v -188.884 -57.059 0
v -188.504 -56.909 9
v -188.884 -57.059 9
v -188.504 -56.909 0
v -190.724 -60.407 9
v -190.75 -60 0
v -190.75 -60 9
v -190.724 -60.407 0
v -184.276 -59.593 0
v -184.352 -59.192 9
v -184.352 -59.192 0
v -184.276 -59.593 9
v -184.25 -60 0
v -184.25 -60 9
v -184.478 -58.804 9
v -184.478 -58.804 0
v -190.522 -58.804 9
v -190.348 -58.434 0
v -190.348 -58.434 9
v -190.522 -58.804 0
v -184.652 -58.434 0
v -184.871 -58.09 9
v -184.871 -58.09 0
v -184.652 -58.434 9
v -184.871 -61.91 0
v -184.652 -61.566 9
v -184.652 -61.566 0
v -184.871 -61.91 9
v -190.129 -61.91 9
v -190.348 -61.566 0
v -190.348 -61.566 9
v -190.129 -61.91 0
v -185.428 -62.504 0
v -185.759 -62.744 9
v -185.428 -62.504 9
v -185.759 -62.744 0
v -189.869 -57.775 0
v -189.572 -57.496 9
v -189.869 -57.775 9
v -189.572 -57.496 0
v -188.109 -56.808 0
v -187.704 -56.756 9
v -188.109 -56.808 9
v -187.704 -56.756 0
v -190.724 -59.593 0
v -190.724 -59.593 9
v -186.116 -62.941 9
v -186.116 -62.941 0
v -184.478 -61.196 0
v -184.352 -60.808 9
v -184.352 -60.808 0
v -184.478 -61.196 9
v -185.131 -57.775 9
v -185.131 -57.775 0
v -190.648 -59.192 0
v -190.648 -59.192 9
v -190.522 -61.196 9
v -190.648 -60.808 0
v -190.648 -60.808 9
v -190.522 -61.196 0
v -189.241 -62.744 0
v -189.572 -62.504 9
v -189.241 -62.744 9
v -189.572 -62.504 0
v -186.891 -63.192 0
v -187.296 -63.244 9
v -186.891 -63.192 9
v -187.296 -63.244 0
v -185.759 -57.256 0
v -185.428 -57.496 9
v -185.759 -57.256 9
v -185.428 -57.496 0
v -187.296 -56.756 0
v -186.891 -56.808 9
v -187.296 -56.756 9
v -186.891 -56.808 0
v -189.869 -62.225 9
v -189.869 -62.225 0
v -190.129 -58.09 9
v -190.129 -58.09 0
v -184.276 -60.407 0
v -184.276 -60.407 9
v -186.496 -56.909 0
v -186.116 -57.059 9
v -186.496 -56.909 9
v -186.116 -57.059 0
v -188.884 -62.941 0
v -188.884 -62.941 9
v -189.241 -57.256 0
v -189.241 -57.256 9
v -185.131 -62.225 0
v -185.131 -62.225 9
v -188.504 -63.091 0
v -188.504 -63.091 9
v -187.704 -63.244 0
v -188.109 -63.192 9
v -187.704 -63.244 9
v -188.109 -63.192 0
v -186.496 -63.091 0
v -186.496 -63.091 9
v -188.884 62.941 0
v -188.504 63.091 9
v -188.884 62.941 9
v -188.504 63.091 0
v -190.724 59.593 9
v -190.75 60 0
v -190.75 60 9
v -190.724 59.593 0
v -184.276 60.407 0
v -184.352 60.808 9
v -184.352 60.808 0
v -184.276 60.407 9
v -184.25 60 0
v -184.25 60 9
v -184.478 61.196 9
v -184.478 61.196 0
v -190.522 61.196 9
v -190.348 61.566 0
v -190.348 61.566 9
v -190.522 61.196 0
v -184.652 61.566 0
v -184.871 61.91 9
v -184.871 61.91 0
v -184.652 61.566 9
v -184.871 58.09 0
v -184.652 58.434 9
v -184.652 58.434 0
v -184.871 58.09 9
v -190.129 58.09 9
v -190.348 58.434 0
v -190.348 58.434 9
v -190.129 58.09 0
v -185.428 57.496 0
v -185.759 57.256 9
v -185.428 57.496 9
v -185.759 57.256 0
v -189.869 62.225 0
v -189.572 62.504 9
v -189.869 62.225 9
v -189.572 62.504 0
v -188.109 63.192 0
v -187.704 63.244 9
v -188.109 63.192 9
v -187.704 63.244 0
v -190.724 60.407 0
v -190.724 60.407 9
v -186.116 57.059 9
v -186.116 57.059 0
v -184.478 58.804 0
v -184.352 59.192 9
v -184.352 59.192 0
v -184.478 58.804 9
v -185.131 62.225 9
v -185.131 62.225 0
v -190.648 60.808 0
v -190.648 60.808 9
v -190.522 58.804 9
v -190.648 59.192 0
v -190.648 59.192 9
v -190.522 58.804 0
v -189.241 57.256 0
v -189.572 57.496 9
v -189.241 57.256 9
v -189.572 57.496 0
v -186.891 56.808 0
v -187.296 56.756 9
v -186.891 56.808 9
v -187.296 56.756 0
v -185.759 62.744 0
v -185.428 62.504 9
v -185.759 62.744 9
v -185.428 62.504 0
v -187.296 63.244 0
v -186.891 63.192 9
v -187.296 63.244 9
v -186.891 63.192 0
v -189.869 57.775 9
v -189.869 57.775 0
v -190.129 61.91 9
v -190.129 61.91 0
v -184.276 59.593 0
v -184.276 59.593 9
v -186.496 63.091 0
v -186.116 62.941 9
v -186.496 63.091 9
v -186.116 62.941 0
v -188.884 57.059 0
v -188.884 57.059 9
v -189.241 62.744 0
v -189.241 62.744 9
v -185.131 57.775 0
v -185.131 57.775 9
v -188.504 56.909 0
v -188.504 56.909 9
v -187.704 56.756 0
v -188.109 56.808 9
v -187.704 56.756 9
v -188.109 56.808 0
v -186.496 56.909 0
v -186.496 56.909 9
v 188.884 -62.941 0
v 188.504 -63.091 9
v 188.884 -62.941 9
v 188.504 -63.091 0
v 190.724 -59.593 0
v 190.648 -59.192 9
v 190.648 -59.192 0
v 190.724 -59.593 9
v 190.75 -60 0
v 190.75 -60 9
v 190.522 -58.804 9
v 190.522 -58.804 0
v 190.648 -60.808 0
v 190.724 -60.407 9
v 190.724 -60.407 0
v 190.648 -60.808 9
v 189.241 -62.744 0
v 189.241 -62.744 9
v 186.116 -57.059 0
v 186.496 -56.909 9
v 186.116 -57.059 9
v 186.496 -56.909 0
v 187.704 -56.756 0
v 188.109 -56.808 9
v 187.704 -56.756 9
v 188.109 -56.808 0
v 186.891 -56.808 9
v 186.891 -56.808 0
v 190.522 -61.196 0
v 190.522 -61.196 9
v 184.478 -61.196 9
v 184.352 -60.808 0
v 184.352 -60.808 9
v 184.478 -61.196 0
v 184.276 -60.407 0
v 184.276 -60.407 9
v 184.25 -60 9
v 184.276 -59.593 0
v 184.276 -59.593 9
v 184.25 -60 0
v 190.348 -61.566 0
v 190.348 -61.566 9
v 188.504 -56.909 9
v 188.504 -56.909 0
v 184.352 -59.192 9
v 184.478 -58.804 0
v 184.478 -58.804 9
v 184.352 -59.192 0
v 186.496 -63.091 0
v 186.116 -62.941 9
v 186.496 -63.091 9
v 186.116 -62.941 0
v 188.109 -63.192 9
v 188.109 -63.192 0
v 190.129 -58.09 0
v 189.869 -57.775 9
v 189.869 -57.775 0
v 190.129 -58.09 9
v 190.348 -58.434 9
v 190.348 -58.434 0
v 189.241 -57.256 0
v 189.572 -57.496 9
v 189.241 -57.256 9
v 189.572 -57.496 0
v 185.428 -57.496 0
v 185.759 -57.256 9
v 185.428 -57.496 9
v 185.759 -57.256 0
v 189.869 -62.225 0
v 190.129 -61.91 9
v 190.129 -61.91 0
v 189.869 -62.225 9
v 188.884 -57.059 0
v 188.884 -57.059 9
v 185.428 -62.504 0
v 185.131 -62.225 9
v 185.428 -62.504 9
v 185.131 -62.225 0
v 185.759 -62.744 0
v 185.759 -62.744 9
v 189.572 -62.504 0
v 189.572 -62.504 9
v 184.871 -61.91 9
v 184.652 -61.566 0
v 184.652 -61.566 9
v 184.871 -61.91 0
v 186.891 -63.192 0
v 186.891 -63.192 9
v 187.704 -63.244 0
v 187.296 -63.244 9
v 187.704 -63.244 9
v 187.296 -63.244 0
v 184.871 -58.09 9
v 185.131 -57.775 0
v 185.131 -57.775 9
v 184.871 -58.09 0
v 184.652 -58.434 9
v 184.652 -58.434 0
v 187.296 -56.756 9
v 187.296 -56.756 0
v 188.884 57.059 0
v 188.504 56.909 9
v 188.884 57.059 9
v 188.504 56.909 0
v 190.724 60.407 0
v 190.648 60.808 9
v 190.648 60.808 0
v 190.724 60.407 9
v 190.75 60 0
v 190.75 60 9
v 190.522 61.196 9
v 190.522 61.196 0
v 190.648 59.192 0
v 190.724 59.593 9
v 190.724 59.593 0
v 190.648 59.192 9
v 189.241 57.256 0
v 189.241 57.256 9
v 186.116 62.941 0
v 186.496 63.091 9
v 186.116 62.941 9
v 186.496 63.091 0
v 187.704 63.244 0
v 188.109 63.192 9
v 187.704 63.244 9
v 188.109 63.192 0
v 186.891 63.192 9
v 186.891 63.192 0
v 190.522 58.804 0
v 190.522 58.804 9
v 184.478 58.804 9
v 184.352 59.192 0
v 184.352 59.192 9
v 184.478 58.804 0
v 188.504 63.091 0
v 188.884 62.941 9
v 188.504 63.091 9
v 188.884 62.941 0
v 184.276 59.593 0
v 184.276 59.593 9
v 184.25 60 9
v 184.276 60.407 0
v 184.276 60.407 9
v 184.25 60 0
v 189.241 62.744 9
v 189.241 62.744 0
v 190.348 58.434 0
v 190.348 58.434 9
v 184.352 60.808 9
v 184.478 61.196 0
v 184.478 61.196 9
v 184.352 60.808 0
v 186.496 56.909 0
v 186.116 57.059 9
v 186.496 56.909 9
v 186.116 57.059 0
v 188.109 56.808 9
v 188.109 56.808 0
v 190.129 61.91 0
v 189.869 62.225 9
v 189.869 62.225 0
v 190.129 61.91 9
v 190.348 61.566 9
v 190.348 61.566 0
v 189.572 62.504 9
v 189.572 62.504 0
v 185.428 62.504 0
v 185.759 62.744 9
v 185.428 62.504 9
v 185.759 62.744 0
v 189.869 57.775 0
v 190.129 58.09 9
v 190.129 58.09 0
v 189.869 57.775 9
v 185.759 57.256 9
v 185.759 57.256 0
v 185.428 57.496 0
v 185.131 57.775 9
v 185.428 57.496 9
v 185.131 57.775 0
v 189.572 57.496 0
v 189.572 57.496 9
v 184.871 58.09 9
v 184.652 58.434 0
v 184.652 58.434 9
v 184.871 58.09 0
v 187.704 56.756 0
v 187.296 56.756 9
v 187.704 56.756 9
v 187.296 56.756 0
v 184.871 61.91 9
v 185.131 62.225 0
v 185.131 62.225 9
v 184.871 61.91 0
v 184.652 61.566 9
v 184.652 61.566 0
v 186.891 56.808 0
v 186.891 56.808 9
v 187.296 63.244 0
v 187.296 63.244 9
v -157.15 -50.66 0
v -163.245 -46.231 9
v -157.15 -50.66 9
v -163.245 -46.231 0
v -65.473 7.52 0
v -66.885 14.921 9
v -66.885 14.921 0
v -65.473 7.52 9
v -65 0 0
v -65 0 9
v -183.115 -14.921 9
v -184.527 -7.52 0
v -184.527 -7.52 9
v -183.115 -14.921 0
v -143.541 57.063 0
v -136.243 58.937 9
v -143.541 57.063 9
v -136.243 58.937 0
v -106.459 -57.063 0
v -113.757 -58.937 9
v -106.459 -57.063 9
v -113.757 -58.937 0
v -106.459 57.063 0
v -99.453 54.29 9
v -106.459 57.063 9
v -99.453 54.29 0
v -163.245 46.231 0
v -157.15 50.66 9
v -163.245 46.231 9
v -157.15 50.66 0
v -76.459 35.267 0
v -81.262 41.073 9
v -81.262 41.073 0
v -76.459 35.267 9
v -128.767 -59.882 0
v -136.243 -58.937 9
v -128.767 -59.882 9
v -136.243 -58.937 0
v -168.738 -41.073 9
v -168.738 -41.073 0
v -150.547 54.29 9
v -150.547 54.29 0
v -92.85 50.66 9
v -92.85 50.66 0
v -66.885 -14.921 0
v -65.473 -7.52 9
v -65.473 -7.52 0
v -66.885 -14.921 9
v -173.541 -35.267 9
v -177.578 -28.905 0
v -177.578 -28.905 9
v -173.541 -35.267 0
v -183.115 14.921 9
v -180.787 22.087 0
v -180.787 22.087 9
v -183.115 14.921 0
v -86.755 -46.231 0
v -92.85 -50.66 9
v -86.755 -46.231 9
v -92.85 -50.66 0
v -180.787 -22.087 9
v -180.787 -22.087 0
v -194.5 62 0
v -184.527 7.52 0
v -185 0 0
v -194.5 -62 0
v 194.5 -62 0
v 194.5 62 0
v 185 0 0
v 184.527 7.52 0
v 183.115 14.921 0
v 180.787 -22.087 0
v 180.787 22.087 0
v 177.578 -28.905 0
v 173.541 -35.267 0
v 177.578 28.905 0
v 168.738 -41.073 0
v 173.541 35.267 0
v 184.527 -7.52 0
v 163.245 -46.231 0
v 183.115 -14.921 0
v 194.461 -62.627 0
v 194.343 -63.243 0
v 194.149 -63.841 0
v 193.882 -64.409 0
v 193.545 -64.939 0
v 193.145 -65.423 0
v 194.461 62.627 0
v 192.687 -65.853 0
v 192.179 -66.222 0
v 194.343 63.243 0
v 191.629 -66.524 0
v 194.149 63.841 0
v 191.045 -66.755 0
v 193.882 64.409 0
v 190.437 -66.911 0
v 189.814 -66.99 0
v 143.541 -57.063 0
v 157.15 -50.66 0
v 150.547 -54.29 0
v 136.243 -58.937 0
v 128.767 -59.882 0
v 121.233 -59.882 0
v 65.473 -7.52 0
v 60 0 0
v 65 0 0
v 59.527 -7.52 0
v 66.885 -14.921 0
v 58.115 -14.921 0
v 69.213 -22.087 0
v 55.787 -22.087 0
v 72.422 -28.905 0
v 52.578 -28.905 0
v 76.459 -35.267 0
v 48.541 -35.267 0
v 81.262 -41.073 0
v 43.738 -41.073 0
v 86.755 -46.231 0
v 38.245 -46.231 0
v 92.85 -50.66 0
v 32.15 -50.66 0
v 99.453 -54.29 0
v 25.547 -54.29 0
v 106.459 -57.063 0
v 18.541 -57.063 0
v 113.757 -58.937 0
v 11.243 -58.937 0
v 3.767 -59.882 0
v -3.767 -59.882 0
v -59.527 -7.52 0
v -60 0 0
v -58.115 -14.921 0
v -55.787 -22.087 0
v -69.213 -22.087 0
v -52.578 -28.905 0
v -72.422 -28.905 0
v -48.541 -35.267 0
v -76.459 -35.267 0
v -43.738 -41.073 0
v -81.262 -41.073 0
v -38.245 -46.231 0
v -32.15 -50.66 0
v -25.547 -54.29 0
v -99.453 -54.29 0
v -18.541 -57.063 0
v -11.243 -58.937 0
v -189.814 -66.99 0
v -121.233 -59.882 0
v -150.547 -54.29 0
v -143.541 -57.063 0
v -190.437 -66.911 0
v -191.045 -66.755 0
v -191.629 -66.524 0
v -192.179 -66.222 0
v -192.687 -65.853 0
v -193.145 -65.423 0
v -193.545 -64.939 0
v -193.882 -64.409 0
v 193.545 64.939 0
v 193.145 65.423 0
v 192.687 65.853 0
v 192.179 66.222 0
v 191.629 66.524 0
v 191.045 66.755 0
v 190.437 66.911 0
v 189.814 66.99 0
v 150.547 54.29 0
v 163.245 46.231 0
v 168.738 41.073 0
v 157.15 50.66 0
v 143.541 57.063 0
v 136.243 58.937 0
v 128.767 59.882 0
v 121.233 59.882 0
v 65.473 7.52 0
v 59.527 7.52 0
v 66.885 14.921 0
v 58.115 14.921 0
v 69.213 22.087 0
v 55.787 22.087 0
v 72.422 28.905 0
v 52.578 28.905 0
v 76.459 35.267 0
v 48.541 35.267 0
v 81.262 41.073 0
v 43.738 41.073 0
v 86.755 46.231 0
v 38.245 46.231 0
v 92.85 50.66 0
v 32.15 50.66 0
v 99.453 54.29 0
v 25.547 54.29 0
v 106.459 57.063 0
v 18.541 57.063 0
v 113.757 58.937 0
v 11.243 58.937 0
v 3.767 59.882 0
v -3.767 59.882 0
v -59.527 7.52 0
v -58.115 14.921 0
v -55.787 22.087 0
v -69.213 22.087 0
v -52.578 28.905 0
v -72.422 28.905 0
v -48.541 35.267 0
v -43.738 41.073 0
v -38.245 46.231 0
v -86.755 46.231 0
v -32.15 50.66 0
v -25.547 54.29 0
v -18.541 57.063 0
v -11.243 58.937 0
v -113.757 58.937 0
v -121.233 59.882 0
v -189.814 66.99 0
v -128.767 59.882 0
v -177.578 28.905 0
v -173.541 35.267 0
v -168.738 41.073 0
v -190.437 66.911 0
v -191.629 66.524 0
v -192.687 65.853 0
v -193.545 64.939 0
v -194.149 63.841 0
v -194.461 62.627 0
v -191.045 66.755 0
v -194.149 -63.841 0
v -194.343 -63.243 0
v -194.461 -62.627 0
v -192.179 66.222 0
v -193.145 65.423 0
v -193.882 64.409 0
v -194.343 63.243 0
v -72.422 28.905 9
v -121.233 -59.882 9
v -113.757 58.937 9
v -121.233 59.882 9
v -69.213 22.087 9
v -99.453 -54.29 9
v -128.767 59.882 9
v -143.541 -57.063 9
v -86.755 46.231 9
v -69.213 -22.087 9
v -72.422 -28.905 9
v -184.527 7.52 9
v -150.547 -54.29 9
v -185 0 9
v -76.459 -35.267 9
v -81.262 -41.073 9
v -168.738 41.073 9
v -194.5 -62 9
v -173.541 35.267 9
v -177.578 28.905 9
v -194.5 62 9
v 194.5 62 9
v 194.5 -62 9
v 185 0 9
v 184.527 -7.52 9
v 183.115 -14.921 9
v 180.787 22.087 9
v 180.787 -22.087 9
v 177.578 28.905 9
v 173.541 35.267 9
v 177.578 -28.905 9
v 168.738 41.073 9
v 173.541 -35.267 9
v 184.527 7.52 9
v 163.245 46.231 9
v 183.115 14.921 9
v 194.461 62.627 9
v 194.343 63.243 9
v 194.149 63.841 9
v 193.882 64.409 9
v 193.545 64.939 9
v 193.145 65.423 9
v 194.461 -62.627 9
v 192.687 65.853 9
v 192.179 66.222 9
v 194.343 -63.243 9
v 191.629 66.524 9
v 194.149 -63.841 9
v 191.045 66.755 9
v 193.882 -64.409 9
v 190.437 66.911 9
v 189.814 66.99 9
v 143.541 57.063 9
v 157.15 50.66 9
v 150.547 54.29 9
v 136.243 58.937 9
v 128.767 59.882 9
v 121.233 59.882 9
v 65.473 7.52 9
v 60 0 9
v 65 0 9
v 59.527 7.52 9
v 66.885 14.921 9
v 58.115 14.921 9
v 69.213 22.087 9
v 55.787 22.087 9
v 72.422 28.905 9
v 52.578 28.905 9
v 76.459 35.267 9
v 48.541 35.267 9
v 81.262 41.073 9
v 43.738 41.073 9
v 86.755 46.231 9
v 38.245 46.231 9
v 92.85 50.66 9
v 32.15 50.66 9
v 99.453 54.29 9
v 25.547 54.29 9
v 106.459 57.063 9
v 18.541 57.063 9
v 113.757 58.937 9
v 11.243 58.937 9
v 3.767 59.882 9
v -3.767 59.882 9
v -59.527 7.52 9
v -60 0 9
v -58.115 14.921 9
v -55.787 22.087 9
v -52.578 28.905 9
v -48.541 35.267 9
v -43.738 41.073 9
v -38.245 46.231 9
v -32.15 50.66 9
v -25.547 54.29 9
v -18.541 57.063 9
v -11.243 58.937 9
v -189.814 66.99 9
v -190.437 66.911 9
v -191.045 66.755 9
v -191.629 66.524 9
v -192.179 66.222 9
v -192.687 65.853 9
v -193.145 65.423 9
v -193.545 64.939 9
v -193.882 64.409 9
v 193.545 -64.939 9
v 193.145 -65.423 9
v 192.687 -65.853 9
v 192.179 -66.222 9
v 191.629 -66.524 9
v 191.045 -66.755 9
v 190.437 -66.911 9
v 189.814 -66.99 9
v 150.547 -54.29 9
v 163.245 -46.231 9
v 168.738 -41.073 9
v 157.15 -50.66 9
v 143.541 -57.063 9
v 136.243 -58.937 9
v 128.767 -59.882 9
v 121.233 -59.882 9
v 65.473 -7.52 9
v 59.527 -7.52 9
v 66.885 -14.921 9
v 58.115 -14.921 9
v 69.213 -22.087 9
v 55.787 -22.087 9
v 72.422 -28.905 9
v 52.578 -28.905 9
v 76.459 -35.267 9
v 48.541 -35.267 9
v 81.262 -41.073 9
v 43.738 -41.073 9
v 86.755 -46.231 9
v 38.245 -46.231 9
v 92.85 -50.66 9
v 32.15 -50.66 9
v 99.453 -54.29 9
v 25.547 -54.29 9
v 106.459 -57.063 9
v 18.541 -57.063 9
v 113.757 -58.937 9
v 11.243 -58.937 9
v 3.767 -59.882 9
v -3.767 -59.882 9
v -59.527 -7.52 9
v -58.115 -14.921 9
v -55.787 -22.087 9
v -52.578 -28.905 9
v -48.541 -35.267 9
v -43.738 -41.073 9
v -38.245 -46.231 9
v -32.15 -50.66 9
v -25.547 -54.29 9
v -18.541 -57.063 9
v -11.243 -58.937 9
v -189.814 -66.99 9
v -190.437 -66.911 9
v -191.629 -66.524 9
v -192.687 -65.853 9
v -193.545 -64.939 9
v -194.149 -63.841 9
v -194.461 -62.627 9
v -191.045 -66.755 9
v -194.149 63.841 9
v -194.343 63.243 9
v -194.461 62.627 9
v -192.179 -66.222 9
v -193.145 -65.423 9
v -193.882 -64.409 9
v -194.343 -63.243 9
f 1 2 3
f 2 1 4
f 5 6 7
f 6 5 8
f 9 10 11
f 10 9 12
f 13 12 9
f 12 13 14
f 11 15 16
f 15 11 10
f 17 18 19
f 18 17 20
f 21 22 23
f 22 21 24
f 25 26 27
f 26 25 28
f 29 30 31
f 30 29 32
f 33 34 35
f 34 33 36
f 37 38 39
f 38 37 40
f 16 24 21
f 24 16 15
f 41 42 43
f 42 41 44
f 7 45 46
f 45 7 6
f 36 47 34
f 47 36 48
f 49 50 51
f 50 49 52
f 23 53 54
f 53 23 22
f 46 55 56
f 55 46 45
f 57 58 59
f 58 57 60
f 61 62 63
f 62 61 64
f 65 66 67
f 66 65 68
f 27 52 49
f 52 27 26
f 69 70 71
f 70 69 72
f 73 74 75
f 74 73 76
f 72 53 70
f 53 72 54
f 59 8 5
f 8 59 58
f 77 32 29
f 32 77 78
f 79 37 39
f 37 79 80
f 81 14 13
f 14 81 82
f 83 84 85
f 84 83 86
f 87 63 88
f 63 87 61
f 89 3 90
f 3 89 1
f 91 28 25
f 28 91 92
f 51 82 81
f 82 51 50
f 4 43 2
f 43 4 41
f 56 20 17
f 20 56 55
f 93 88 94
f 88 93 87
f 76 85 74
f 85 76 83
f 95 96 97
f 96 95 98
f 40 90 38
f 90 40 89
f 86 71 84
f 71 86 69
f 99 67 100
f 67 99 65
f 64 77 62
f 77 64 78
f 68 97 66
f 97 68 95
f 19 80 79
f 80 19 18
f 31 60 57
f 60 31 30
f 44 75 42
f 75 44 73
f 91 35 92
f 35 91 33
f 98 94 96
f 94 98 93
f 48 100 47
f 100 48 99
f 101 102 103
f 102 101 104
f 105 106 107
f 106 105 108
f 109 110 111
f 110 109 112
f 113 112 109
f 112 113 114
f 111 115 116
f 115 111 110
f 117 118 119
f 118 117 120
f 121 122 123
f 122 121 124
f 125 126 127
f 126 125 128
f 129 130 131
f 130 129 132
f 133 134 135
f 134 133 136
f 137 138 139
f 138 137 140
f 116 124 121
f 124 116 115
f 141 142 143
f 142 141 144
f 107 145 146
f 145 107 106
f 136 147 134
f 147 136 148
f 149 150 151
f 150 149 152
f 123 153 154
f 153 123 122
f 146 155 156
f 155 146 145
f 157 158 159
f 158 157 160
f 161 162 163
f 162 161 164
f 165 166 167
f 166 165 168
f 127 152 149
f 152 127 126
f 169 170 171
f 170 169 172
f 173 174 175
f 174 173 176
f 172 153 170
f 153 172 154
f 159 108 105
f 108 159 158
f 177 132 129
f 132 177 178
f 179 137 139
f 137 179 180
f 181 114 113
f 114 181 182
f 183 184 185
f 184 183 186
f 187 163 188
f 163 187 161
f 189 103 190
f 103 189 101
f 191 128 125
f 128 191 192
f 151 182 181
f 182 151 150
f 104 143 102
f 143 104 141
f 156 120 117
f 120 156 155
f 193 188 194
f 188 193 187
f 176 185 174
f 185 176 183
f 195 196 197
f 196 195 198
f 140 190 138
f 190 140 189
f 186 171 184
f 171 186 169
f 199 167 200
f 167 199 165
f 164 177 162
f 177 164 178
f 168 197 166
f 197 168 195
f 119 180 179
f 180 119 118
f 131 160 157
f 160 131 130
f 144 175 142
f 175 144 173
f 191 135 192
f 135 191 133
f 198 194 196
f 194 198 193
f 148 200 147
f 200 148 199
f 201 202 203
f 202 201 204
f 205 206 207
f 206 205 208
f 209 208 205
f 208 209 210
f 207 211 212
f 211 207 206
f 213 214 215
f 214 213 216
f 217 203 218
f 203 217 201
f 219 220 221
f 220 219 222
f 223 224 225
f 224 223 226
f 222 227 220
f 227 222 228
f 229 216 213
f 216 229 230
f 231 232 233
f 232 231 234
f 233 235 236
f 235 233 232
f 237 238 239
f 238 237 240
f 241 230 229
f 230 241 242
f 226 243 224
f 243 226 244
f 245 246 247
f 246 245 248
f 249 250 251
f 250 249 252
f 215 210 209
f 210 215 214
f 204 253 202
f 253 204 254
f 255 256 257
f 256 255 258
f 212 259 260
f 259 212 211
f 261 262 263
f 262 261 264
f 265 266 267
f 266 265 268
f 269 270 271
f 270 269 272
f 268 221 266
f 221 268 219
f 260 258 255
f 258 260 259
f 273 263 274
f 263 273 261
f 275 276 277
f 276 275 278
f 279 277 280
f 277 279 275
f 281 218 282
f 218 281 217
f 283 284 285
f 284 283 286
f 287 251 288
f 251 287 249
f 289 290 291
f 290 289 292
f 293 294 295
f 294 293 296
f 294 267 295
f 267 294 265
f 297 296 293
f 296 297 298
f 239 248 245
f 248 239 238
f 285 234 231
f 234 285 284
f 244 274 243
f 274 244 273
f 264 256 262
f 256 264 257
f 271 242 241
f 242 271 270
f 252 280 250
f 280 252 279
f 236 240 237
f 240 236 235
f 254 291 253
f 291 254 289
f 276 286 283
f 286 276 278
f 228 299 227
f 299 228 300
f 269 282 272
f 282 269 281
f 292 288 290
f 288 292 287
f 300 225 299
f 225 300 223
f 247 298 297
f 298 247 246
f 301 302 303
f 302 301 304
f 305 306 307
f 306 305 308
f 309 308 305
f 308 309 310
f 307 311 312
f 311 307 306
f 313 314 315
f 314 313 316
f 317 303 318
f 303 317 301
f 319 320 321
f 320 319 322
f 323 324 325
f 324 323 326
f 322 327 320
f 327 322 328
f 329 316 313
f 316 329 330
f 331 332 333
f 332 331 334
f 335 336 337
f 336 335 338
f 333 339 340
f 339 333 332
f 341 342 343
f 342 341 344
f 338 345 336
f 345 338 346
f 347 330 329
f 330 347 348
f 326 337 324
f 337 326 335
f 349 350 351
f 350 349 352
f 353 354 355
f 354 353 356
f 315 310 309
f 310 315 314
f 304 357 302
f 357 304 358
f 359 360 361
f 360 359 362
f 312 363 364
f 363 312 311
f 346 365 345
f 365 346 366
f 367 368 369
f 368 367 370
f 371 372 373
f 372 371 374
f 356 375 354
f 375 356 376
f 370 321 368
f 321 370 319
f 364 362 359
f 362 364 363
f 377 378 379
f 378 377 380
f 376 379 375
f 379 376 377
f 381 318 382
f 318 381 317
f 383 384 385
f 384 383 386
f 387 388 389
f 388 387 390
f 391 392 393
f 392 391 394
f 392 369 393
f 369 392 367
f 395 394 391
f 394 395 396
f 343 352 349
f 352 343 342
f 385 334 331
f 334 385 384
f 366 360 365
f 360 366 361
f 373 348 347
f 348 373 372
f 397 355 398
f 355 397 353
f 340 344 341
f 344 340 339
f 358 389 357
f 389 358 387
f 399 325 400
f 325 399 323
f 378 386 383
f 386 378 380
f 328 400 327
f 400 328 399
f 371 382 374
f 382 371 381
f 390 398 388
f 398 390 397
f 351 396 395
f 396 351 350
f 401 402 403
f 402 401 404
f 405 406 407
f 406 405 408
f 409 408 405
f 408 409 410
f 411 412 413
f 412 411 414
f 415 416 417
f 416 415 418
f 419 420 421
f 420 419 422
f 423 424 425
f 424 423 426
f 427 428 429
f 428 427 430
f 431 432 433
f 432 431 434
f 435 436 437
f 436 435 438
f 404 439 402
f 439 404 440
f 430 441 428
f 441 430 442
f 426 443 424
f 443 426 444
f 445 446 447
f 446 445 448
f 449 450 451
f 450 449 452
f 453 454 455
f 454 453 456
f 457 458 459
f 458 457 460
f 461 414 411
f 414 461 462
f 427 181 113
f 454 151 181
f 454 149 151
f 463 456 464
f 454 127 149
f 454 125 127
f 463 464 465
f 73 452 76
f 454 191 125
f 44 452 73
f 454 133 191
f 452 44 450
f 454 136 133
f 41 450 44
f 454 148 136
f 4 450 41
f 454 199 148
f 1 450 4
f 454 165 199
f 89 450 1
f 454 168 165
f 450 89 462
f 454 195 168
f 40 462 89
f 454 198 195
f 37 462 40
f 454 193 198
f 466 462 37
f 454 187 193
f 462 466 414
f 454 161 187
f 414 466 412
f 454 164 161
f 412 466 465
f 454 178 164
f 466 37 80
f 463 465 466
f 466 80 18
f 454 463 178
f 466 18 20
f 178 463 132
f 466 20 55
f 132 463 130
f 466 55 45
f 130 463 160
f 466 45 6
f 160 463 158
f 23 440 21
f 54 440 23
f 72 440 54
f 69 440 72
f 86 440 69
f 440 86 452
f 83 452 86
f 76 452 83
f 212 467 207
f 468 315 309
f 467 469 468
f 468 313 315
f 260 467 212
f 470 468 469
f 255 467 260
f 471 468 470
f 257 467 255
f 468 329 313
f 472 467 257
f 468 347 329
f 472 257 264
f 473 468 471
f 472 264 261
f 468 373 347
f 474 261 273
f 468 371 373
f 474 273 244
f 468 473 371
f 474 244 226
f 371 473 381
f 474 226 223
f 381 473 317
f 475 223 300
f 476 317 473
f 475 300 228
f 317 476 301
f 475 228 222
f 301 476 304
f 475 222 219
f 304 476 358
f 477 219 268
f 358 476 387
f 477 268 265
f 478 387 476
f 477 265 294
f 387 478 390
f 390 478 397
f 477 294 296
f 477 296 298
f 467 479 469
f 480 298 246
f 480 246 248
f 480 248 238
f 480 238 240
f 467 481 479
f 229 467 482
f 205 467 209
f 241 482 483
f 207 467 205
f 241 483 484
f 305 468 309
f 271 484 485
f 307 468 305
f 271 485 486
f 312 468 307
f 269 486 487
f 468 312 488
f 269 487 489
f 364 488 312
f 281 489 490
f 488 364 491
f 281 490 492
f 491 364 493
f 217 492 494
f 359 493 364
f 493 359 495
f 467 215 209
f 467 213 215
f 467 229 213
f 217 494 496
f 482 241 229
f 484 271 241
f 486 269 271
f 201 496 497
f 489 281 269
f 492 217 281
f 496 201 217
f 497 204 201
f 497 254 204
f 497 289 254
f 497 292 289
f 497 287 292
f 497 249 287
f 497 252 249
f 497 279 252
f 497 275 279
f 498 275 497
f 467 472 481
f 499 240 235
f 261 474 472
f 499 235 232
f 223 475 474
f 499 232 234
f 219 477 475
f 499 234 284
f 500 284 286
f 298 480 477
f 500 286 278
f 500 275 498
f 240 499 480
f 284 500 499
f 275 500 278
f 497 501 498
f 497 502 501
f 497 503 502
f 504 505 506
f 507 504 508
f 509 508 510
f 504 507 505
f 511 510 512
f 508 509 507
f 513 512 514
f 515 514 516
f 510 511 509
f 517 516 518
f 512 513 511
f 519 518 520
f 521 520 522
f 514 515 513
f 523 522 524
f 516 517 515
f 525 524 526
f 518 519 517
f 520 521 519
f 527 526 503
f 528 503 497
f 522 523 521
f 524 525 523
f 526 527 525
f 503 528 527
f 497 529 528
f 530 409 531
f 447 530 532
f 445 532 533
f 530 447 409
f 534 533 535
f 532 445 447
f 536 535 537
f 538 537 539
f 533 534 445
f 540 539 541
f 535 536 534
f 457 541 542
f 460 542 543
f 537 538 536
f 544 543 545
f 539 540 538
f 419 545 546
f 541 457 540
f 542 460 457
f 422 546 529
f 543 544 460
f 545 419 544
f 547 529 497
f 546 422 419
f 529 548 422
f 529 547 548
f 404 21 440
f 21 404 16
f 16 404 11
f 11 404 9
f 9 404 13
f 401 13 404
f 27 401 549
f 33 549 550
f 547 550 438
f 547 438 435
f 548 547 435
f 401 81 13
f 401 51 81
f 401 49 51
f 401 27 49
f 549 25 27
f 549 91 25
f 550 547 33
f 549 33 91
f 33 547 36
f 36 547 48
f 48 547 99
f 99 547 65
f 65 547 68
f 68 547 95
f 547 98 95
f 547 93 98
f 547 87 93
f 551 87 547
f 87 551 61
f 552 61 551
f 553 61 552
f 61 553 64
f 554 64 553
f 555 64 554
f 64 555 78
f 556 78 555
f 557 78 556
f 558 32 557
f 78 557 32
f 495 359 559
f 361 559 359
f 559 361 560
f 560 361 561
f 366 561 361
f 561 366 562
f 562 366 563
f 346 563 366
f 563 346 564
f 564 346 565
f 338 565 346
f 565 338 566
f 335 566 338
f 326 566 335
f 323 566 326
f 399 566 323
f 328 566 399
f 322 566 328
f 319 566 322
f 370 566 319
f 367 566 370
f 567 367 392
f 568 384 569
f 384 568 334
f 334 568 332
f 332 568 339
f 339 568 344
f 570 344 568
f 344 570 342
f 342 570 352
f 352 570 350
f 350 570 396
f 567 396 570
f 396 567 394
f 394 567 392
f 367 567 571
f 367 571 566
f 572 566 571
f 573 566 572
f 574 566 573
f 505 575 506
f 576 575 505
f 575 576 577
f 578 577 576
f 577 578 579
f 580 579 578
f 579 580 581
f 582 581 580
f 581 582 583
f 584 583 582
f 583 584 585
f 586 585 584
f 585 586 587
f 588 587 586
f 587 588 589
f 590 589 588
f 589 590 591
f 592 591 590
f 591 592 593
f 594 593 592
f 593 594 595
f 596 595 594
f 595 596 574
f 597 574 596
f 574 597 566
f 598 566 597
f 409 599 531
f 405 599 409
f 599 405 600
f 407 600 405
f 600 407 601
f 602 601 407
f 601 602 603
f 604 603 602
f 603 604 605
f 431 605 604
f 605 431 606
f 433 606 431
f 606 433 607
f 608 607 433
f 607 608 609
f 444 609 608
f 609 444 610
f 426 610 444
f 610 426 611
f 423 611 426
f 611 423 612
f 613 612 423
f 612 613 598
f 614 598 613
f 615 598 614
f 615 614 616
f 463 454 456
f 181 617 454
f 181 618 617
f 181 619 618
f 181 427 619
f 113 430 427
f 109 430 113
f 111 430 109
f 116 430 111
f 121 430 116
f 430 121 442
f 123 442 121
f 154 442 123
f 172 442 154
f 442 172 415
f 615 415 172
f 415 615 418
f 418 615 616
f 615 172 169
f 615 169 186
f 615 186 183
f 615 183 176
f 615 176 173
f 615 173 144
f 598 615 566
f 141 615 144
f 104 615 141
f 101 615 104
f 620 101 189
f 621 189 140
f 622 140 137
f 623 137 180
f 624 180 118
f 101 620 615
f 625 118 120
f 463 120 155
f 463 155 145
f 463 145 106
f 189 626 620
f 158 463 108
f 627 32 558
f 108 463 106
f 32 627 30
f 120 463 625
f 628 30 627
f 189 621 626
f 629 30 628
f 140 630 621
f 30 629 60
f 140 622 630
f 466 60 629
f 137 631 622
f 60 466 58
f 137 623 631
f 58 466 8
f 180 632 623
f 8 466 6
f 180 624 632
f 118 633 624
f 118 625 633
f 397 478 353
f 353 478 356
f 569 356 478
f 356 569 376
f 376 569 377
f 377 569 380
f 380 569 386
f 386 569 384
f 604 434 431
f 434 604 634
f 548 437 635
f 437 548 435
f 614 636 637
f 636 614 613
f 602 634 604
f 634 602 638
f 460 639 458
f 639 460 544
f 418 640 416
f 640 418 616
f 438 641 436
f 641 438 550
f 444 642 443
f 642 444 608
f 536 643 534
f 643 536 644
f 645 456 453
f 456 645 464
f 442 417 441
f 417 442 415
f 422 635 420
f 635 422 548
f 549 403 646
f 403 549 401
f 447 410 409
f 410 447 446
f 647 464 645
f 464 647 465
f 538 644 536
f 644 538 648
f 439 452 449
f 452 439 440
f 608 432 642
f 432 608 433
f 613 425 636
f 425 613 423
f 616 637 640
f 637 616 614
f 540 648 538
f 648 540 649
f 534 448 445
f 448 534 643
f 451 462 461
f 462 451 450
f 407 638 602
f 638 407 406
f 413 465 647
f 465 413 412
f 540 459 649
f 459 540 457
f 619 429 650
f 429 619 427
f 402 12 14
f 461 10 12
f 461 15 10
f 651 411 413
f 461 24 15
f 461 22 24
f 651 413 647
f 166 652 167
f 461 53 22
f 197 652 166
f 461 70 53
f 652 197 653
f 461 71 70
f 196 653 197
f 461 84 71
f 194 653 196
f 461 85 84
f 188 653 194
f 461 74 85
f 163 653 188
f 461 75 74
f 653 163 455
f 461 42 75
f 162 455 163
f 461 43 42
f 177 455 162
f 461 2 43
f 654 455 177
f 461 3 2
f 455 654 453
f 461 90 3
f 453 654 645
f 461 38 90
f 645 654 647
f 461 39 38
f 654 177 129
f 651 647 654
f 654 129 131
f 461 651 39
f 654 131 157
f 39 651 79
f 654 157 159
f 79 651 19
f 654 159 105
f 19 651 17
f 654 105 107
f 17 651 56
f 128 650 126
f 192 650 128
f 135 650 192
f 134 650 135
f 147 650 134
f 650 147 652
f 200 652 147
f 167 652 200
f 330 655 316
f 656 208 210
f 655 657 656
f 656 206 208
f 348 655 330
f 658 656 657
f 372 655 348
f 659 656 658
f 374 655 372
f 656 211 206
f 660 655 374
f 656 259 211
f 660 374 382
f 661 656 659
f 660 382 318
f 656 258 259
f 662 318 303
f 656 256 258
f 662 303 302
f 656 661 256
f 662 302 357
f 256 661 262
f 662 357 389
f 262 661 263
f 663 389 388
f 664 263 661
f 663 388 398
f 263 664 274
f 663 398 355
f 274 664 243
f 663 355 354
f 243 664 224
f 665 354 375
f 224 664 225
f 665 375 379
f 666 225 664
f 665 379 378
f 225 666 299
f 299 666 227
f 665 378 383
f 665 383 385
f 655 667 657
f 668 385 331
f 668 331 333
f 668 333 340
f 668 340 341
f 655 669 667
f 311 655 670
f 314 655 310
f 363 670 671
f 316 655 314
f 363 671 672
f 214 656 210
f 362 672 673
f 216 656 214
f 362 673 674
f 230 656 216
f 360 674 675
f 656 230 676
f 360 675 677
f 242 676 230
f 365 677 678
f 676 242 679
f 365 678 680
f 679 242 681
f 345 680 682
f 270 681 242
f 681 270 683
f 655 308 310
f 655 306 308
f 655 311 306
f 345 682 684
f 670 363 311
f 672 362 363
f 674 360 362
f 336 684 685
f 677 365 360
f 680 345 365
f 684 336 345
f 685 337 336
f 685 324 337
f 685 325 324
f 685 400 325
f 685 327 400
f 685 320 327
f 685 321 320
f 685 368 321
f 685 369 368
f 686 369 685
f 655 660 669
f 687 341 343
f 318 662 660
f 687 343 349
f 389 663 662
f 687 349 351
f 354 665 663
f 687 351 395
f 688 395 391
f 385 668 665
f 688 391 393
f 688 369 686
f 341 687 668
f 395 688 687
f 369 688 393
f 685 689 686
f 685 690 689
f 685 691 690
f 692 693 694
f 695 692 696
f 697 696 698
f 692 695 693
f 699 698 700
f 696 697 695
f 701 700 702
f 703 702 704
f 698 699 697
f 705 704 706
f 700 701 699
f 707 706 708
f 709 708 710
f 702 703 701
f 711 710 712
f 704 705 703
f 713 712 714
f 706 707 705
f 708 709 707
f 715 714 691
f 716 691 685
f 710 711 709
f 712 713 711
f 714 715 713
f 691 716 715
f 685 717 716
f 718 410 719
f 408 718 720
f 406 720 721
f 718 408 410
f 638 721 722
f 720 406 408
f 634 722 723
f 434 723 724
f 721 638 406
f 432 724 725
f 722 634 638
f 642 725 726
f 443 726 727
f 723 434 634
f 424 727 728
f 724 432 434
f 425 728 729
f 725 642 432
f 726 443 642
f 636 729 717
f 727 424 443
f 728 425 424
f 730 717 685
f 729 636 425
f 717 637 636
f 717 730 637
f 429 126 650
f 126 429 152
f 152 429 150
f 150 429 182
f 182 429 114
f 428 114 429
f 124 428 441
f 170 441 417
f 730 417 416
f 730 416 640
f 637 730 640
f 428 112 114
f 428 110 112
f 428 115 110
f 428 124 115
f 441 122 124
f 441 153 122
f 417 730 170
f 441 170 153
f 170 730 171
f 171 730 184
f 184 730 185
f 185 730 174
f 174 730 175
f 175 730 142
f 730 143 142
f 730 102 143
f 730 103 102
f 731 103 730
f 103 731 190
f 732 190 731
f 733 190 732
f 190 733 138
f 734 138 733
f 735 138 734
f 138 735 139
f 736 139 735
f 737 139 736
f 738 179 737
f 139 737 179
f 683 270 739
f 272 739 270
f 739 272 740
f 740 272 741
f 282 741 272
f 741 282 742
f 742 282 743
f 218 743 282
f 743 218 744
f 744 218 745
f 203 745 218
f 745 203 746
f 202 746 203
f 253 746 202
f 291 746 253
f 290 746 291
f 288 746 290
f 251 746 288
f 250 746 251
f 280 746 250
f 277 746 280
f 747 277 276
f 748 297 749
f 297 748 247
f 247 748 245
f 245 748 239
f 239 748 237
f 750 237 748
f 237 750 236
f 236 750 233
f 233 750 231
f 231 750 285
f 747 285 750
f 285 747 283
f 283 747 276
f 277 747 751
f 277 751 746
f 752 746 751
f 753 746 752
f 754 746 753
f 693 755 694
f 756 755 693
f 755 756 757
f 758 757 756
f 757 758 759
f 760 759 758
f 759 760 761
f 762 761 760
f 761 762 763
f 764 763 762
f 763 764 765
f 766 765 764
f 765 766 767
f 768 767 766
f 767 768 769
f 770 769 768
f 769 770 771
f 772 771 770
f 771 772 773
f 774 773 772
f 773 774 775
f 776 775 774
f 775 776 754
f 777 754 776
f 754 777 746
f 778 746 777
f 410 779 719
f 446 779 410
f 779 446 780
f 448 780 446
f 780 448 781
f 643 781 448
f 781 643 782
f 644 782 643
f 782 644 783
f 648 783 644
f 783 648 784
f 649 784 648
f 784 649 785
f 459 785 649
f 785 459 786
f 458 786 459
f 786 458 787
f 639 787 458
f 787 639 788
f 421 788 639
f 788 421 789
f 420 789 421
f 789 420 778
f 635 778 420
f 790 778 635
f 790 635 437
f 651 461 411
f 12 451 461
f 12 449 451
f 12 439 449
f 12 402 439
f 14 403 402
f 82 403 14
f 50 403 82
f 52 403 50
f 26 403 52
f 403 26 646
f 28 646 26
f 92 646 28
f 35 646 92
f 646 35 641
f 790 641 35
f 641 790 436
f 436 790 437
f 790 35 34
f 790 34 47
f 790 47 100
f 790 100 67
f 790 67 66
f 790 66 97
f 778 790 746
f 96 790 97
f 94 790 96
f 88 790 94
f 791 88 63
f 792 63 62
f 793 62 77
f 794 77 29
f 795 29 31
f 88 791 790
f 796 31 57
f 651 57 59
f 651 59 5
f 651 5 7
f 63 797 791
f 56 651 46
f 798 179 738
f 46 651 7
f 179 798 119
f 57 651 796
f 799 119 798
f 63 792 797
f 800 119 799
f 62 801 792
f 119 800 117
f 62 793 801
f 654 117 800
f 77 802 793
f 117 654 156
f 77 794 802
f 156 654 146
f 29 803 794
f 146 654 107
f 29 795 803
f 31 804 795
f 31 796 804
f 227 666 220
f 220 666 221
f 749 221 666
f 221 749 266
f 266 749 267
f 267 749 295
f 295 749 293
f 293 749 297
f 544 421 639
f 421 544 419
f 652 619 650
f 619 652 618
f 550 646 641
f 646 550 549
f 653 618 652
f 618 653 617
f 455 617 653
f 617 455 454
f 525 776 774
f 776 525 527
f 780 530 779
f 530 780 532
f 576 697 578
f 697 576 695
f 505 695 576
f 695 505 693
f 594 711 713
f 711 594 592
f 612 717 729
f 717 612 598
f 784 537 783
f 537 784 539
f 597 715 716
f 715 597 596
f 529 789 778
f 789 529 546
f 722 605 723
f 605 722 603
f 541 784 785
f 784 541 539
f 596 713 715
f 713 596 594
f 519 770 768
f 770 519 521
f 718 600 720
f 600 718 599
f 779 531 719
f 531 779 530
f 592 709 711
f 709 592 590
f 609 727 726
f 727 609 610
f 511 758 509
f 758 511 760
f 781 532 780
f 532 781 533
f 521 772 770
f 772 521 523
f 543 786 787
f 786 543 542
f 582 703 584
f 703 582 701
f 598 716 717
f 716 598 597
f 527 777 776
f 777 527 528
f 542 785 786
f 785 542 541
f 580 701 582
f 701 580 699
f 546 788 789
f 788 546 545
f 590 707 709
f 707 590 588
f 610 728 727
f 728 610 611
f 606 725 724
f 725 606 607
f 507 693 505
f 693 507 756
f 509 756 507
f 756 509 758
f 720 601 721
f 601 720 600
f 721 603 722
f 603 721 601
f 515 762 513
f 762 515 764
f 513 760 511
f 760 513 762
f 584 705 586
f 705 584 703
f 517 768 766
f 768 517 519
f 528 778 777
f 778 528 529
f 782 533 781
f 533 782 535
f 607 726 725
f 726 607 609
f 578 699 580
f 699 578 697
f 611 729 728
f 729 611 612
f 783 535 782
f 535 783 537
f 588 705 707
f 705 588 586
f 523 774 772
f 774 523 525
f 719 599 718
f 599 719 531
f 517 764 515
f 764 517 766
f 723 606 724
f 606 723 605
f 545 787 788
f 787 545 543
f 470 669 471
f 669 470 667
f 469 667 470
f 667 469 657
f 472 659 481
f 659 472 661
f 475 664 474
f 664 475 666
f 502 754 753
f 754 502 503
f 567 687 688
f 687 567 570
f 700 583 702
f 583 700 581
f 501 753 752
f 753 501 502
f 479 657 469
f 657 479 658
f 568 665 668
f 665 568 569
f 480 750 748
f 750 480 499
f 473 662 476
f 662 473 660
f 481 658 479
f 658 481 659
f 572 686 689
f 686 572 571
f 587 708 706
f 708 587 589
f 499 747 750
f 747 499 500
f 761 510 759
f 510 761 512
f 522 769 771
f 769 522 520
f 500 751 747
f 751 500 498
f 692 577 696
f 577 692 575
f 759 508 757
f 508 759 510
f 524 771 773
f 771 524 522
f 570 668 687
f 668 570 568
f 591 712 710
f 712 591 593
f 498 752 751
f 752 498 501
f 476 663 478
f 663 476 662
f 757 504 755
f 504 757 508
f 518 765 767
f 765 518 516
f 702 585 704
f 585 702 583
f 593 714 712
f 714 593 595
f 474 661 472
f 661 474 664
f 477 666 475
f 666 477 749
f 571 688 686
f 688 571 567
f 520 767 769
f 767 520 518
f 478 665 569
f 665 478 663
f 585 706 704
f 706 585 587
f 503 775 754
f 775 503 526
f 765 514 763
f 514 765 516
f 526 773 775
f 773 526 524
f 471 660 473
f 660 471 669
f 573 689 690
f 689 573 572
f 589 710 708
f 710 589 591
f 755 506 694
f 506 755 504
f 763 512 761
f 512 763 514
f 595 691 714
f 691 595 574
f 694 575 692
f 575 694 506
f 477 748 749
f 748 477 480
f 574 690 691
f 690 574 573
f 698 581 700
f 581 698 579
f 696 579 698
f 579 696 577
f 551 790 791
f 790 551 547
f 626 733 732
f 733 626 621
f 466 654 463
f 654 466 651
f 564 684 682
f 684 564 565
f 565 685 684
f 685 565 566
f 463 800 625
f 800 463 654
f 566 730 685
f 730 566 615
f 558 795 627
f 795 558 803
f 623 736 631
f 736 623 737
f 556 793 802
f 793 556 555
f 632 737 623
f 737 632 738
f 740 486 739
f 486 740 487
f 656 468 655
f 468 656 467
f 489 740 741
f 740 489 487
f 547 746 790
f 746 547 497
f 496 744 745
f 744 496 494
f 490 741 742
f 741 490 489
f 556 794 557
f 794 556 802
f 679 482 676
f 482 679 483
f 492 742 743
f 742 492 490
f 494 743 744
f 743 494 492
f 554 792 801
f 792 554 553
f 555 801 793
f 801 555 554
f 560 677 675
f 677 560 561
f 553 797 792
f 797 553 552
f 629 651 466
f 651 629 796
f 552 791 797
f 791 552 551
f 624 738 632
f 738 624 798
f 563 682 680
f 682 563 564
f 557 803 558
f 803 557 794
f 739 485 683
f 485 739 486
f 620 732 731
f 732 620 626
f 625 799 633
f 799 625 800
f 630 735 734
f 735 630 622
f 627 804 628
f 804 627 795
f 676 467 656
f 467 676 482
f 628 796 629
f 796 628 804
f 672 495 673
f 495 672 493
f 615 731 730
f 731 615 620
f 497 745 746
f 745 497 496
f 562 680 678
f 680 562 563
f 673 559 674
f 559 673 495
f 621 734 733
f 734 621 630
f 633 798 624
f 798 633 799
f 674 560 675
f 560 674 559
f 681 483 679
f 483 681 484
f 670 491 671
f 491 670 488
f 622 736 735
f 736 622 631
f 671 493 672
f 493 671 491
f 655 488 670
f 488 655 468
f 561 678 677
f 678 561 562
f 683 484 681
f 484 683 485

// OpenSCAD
$fn = 50;


difference() {
	union() {
		hull() {
			translate(v = [-189.5000000000, 62.0000000000, 0]) {
				cylinder(h = 9, r = 5);
			}
			translate(v = [189.5000000000, 62.0000000000, 0]) {
				cylinder(h = 9, r = 5);
			}
			translate(v = [-189.5000000000, -62.0000000000, 0]) {
				cylinder(h = 9, r = 5);
			}
			translate(v = [189.5000000000, -62.0000000000, 0]) {
				cylinder(h = 9, r = 5);
			}
		}
	}
	union() {
		#translate(v = [-187.5000000000, -60.0000000000, -100.0000000000]) {
			cylinder(h = 200, r = 3.2500000000);
		}
		#translate(v = [-187.5000000000, 60.0000000000, -100.0000000000]) {
			cylinder(h = 200, r = 3.2500000000);
		}
		#translate(v = [187.5000000000, -60.0000000000, -100.0000000000]) {
			cylinder(h = 200, r = 3.2500000000);
		}
		#translate(v = [187.5000000000, 60.0000000000, -100.0000000000]) {
			cylinder(h = 200, r = 3.2500000000);
		}
		#translate(v = [-125.0000000000, 0, 0]) {
			cylinder(h = 9, r = 60.0000000000);
		}
		#cylinder(h = 9, r = 60.0000000000);
		#translate(v = [125.0000000000, 0, 0]) {
			cylinder(h = 9, r = 60.0000000000);
		}
	}
}
